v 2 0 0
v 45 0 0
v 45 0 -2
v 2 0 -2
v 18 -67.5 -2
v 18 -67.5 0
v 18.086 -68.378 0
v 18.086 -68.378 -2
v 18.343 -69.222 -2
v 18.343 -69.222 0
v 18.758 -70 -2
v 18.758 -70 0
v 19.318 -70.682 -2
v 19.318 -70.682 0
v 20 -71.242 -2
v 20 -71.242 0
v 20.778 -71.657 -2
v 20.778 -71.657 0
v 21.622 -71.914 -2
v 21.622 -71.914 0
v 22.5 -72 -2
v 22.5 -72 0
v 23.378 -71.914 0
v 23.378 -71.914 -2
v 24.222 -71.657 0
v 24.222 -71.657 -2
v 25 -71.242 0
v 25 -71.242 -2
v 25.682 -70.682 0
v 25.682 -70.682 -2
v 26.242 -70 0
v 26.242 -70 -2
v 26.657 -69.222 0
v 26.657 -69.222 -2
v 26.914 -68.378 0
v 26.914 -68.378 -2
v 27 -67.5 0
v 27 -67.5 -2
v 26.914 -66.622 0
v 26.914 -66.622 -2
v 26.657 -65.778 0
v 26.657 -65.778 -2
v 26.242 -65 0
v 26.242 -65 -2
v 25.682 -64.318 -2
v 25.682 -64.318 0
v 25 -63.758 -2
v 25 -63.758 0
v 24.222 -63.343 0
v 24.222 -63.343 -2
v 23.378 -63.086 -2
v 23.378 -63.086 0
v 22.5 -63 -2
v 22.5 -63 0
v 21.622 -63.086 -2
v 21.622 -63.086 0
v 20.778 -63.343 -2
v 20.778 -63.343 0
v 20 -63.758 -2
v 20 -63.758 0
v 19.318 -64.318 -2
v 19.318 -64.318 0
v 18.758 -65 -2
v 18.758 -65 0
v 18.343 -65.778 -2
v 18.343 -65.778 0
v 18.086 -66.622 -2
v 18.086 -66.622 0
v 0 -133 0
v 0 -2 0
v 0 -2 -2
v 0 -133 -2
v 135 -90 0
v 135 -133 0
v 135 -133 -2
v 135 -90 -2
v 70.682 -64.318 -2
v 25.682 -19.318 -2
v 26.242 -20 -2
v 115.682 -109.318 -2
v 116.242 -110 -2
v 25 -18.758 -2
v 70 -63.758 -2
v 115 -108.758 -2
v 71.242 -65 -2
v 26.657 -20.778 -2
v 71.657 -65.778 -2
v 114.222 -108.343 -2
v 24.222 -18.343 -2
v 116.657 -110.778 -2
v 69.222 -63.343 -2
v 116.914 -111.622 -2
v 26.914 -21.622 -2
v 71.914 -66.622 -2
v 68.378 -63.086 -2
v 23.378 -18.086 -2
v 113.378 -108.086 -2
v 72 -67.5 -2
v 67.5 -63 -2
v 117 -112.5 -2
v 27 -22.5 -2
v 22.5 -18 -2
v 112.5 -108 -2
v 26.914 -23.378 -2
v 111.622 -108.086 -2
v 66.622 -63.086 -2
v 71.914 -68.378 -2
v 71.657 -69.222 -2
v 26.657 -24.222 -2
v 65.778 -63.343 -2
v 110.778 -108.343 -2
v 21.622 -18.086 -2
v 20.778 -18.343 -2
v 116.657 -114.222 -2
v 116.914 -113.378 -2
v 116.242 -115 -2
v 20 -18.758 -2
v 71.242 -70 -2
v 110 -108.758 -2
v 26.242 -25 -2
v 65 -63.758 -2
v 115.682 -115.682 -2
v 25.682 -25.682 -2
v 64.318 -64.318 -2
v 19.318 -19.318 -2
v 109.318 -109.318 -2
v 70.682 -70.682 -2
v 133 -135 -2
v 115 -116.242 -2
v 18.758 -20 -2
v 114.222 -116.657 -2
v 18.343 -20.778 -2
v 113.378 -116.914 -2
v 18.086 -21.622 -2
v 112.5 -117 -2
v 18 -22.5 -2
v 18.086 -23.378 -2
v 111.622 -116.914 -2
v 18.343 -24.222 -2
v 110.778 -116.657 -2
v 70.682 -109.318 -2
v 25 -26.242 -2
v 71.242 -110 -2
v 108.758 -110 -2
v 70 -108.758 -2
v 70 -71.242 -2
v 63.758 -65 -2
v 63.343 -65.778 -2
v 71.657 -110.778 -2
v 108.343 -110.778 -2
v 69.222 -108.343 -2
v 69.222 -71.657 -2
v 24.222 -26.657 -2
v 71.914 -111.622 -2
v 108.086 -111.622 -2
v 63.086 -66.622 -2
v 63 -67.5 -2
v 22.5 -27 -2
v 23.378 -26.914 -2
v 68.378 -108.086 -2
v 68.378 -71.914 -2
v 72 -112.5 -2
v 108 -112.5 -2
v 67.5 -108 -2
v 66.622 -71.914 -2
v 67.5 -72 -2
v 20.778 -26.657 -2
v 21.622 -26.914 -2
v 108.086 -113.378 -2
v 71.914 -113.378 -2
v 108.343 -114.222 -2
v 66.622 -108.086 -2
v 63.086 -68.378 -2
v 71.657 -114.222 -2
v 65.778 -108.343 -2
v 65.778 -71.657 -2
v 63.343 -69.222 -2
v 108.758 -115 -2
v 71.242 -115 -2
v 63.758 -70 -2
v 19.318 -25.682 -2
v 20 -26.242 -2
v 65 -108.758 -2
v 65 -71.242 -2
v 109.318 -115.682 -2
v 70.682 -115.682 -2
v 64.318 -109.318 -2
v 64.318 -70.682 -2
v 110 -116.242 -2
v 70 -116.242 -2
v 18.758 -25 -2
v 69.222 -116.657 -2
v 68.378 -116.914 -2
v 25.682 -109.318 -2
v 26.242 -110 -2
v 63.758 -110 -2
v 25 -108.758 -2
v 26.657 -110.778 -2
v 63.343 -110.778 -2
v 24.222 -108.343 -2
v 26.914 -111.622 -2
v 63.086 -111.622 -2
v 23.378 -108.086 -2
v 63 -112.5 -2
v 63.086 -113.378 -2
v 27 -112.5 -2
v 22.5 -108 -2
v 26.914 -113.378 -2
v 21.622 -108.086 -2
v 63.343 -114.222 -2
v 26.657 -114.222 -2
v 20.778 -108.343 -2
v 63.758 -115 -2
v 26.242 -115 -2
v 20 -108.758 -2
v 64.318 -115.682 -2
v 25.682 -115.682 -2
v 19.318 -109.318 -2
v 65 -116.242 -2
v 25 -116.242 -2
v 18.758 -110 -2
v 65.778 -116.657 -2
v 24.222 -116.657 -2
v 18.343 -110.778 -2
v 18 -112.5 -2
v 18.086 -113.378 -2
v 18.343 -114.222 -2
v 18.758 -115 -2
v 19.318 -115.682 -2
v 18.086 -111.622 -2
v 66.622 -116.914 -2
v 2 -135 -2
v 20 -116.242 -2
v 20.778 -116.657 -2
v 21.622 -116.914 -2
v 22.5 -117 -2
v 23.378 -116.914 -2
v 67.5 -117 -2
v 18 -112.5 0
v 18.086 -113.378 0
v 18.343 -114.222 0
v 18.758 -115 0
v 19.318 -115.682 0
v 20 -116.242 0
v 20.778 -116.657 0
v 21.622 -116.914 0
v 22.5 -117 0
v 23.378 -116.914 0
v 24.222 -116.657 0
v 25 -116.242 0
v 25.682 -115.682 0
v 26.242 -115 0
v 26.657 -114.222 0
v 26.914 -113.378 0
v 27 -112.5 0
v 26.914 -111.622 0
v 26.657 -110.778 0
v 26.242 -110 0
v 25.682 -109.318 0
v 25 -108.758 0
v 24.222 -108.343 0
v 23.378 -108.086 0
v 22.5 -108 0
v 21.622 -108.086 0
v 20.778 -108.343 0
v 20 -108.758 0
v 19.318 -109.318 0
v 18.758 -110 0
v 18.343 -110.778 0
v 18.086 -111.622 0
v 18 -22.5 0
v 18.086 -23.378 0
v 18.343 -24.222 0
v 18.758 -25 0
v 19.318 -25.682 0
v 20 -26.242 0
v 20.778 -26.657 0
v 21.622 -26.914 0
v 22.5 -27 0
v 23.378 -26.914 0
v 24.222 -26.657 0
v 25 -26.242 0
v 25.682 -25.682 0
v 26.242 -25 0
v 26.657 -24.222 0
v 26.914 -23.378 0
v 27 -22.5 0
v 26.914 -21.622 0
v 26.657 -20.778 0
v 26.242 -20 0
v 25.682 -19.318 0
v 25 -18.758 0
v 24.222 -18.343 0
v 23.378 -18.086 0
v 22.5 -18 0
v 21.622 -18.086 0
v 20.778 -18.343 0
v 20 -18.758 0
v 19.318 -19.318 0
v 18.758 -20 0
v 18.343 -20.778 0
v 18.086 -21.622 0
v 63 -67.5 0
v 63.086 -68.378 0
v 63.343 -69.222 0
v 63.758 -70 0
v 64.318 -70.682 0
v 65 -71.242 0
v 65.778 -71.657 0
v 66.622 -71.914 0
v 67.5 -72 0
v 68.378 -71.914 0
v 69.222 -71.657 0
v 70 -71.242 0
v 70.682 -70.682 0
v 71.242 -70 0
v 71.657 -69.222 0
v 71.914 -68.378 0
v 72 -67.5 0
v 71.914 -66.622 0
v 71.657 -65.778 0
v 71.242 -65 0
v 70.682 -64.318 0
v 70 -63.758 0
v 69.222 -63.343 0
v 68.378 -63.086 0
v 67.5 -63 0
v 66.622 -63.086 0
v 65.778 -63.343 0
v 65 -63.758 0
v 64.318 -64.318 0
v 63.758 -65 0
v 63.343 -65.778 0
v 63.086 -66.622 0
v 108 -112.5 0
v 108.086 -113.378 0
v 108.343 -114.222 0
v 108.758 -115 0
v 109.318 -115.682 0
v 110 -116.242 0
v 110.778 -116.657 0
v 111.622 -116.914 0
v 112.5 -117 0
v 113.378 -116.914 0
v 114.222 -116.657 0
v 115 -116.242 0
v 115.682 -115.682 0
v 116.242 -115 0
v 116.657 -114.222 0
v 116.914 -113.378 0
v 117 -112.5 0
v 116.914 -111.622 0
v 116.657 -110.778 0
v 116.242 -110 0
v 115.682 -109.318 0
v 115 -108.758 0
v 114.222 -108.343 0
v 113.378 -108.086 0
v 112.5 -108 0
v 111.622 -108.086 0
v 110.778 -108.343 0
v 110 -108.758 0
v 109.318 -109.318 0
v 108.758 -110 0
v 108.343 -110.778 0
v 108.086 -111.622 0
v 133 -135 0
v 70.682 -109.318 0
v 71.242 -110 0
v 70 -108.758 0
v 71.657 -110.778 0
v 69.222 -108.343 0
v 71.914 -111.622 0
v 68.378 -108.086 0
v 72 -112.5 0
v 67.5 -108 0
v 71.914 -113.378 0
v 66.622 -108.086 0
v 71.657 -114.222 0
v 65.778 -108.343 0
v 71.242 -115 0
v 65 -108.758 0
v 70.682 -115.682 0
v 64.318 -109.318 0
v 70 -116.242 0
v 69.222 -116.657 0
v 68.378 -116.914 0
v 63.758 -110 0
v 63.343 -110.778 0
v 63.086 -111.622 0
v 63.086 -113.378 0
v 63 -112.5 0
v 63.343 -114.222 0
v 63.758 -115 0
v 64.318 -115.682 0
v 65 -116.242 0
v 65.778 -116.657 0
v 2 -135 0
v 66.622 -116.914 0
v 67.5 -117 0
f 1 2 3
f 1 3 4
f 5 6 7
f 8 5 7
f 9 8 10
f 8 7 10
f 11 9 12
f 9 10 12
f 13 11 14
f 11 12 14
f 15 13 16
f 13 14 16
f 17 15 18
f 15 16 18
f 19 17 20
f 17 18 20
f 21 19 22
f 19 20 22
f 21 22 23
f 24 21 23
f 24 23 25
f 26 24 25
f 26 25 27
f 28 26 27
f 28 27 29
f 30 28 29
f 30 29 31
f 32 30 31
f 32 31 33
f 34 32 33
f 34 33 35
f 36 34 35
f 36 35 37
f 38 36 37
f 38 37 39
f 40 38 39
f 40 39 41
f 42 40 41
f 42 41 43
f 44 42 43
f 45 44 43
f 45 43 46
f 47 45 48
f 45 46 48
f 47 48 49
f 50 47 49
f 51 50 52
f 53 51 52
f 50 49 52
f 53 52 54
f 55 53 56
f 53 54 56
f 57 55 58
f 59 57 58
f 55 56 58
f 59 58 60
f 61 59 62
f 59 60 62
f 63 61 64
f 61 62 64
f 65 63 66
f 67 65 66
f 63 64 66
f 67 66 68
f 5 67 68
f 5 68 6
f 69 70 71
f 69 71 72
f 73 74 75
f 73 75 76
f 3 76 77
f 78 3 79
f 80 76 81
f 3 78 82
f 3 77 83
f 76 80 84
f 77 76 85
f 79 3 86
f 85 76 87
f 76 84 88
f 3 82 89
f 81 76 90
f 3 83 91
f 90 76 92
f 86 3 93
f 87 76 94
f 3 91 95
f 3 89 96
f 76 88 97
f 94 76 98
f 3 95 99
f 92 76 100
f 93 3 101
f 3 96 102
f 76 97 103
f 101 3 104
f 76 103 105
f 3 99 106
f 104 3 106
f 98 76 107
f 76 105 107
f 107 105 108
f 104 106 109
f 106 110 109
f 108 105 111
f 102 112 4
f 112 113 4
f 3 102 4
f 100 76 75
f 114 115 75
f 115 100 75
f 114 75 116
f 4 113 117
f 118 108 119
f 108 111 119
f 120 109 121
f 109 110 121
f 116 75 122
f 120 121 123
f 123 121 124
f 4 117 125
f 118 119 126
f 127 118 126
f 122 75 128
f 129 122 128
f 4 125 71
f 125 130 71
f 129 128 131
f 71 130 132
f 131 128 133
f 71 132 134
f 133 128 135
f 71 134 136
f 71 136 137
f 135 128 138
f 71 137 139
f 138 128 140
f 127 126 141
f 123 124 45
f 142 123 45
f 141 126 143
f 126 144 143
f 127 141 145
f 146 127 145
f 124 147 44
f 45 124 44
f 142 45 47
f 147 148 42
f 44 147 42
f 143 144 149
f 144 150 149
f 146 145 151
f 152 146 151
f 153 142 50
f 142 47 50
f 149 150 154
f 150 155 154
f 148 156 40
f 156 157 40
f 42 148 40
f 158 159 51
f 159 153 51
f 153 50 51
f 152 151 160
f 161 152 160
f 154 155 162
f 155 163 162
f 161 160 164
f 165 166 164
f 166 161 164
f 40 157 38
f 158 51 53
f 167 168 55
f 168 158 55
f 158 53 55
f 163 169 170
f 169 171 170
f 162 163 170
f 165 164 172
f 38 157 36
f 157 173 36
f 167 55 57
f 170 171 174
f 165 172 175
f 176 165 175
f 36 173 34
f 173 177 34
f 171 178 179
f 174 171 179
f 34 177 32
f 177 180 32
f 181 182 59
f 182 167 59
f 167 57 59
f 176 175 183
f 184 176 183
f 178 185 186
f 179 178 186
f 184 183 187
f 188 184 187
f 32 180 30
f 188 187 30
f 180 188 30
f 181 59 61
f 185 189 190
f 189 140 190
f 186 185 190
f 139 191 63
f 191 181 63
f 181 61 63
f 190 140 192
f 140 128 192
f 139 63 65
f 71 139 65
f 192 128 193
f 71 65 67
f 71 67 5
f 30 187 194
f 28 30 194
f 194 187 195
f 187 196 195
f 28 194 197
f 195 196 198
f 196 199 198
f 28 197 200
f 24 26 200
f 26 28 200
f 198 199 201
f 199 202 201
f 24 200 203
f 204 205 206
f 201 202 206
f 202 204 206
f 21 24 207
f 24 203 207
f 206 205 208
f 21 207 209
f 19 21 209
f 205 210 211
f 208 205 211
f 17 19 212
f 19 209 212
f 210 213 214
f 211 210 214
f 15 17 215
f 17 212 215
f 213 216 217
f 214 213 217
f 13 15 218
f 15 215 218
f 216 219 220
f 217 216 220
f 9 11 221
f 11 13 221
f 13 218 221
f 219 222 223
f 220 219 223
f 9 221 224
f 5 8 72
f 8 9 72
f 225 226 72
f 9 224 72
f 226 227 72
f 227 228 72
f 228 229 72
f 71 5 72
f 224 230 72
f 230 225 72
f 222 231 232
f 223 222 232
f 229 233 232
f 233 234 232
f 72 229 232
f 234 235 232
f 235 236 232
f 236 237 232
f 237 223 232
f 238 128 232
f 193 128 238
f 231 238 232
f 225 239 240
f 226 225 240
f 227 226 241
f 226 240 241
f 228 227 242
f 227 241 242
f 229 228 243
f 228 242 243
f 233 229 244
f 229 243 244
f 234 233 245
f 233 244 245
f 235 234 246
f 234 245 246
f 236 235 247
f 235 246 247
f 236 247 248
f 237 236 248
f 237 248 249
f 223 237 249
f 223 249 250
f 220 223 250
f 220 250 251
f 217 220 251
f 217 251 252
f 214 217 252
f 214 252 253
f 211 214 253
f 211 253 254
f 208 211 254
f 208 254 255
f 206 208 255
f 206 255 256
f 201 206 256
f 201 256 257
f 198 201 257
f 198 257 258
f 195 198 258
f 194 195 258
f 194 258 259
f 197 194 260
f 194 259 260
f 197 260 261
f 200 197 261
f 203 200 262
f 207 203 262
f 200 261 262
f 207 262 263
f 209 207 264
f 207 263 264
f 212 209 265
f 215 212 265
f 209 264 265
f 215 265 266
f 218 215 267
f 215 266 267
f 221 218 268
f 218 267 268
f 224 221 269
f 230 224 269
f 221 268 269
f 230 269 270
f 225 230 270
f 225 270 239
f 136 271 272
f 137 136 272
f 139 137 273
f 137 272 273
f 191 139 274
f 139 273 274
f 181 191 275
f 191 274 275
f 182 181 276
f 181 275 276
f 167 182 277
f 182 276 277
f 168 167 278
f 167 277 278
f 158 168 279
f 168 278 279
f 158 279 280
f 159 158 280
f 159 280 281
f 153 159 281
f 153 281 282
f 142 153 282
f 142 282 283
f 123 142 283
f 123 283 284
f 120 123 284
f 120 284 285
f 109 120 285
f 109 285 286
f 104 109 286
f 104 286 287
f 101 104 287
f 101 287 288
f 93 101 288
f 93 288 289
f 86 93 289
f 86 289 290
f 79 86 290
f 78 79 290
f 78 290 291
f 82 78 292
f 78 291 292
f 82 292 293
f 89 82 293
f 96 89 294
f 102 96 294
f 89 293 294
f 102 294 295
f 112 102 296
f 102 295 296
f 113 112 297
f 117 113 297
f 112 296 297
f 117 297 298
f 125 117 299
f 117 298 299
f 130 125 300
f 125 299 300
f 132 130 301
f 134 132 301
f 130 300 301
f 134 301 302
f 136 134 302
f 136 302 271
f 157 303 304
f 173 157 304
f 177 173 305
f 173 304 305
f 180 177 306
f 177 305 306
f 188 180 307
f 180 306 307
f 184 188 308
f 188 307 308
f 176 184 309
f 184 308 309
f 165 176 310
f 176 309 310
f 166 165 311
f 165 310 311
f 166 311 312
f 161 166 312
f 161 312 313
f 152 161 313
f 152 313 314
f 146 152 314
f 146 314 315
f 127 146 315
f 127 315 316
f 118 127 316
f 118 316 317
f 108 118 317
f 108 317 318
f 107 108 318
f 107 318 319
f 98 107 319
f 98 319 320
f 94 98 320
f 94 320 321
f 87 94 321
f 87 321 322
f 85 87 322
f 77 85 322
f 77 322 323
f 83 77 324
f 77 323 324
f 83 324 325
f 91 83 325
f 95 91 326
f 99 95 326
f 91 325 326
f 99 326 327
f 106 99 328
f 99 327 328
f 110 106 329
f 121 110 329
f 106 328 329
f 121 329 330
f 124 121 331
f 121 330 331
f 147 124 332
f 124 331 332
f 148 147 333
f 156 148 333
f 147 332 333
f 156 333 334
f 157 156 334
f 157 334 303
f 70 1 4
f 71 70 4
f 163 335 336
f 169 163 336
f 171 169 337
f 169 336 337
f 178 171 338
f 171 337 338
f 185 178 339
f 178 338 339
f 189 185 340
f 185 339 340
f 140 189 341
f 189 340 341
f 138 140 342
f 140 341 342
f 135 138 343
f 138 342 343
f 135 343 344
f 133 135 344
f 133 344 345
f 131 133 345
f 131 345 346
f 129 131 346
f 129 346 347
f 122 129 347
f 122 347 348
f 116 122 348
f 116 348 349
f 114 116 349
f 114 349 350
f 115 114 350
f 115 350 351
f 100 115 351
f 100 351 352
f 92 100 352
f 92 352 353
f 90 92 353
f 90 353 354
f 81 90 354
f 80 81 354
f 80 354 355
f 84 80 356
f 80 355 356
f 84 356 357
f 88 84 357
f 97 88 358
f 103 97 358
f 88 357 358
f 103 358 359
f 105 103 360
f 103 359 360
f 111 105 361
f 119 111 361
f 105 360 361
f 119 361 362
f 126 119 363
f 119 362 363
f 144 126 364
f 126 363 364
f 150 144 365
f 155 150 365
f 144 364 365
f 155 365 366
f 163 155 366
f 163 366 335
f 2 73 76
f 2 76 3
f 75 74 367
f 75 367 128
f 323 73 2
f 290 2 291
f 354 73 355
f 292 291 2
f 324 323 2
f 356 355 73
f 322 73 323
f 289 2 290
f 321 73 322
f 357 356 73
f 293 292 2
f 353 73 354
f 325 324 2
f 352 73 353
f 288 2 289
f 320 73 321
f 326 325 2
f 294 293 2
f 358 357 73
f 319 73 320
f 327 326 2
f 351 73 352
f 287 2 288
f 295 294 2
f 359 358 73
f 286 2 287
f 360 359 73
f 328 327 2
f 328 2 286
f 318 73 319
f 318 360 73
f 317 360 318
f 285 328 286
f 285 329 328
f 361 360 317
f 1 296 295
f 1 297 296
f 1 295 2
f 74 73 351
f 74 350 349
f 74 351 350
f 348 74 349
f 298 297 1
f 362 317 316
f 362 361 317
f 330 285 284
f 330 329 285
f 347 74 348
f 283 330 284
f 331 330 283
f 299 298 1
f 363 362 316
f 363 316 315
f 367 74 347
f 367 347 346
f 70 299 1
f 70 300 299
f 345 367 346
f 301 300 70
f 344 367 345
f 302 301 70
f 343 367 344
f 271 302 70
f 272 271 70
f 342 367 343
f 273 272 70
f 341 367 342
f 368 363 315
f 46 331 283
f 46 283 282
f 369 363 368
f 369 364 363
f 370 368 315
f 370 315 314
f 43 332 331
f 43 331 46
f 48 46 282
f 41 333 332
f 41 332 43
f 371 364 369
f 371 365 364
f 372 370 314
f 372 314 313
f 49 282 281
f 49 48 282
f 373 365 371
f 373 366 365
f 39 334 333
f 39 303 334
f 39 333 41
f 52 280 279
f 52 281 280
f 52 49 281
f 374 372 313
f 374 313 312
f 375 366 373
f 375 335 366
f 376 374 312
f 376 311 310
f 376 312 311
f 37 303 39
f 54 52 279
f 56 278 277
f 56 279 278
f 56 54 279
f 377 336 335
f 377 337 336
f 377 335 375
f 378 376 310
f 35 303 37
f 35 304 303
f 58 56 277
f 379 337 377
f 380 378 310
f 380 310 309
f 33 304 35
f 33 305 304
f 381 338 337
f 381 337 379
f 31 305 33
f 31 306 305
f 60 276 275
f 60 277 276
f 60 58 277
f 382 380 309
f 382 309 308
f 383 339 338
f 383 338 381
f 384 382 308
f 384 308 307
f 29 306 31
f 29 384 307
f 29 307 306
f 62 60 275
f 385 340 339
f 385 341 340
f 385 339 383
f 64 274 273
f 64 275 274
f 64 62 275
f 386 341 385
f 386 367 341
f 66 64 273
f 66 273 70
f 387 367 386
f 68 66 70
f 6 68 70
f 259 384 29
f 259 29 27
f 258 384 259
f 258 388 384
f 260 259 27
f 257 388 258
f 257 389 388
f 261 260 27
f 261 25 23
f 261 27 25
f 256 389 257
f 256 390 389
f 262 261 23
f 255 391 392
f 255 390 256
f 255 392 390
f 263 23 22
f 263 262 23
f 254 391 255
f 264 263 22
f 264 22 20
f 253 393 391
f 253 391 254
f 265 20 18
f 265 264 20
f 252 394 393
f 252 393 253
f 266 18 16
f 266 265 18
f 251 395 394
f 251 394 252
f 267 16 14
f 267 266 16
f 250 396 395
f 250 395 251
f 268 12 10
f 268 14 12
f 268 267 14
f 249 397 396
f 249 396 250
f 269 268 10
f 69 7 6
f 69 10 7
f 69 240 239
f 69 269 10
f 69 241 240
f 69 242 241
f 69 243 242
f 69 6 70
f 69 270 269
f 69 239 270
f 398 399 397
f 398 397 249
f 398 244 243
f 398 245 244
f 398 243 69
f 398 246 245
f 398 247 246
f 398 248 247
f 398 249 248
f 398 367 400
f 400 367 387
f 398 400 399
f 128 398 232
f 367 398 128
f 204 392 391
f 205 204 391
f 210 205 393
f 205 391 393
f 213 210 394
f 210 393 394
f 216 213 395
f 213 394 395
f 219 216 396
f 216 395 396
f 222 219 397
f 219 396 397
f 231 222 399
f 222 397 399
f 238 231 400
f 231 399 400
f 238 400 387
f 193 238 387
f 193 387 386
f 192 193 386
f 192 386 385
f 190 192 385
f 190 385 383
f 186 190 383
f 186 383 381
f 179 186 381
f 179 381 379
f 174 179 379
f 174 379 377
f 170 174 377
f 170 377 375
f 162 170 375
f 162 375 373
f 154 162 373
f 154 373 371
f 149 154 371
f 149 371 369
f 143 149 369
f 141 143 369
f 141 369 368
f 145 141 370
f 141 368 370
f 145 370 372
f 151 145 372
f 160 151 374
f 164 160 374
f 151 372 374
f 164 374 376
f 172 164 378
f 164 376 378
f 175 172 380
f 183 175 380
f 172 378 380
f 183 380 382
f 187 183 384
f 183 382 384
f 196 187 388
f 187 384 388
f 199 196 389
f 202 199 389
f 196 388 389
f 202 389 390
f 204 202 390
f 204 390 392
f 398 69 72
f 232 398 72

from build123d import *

# Parameters (mm, degrees)
EXTRUDE_1_DEPTH   = 2
HOLE_WIZARD_M81_D = 9
CHAMFER_1_SIZE    = 2


with BuildPart() as part:
    # Эскиз1 → Бобышка-Вытянуть1 (new body)
    with BuildSketch(Plane(origin=(0, 0, 0), x_dir=(1, 0, 0), z_dir=(0, 0, -1))):
        Polygon((0, 0), (0, 135), (135, 135), (135, 90), (45, 0), align=None)
    extrude(amount=EXTRUDE_1_DEPTH)

    # Отверстие с зазором M81 (through all)
    with Locations(Plane(origin=(0, 0, -2), x_dir=(1, 0, 0), z_dir=(0, 0, -1))):
        with Locations((67.5, 112.5), (22.5, 112.5), (22.5, 67.5), (22.5, 22.5), (112.5, 112.5), (67.5, 67.5)):
            Hole(HOLE_WIZARD_M81_D / 2)

    # Фаска1
    chamfer_1_edges = [part.edges().sort_by_distance(p)[0] for p in [
        (0, 0, -1),
        (0, -135, -1),
        (135, -135, -1),
    ]]
    chamfer(chamfer_1_edges, length=CHAMFER_1_SIZE)


solid = part.part
